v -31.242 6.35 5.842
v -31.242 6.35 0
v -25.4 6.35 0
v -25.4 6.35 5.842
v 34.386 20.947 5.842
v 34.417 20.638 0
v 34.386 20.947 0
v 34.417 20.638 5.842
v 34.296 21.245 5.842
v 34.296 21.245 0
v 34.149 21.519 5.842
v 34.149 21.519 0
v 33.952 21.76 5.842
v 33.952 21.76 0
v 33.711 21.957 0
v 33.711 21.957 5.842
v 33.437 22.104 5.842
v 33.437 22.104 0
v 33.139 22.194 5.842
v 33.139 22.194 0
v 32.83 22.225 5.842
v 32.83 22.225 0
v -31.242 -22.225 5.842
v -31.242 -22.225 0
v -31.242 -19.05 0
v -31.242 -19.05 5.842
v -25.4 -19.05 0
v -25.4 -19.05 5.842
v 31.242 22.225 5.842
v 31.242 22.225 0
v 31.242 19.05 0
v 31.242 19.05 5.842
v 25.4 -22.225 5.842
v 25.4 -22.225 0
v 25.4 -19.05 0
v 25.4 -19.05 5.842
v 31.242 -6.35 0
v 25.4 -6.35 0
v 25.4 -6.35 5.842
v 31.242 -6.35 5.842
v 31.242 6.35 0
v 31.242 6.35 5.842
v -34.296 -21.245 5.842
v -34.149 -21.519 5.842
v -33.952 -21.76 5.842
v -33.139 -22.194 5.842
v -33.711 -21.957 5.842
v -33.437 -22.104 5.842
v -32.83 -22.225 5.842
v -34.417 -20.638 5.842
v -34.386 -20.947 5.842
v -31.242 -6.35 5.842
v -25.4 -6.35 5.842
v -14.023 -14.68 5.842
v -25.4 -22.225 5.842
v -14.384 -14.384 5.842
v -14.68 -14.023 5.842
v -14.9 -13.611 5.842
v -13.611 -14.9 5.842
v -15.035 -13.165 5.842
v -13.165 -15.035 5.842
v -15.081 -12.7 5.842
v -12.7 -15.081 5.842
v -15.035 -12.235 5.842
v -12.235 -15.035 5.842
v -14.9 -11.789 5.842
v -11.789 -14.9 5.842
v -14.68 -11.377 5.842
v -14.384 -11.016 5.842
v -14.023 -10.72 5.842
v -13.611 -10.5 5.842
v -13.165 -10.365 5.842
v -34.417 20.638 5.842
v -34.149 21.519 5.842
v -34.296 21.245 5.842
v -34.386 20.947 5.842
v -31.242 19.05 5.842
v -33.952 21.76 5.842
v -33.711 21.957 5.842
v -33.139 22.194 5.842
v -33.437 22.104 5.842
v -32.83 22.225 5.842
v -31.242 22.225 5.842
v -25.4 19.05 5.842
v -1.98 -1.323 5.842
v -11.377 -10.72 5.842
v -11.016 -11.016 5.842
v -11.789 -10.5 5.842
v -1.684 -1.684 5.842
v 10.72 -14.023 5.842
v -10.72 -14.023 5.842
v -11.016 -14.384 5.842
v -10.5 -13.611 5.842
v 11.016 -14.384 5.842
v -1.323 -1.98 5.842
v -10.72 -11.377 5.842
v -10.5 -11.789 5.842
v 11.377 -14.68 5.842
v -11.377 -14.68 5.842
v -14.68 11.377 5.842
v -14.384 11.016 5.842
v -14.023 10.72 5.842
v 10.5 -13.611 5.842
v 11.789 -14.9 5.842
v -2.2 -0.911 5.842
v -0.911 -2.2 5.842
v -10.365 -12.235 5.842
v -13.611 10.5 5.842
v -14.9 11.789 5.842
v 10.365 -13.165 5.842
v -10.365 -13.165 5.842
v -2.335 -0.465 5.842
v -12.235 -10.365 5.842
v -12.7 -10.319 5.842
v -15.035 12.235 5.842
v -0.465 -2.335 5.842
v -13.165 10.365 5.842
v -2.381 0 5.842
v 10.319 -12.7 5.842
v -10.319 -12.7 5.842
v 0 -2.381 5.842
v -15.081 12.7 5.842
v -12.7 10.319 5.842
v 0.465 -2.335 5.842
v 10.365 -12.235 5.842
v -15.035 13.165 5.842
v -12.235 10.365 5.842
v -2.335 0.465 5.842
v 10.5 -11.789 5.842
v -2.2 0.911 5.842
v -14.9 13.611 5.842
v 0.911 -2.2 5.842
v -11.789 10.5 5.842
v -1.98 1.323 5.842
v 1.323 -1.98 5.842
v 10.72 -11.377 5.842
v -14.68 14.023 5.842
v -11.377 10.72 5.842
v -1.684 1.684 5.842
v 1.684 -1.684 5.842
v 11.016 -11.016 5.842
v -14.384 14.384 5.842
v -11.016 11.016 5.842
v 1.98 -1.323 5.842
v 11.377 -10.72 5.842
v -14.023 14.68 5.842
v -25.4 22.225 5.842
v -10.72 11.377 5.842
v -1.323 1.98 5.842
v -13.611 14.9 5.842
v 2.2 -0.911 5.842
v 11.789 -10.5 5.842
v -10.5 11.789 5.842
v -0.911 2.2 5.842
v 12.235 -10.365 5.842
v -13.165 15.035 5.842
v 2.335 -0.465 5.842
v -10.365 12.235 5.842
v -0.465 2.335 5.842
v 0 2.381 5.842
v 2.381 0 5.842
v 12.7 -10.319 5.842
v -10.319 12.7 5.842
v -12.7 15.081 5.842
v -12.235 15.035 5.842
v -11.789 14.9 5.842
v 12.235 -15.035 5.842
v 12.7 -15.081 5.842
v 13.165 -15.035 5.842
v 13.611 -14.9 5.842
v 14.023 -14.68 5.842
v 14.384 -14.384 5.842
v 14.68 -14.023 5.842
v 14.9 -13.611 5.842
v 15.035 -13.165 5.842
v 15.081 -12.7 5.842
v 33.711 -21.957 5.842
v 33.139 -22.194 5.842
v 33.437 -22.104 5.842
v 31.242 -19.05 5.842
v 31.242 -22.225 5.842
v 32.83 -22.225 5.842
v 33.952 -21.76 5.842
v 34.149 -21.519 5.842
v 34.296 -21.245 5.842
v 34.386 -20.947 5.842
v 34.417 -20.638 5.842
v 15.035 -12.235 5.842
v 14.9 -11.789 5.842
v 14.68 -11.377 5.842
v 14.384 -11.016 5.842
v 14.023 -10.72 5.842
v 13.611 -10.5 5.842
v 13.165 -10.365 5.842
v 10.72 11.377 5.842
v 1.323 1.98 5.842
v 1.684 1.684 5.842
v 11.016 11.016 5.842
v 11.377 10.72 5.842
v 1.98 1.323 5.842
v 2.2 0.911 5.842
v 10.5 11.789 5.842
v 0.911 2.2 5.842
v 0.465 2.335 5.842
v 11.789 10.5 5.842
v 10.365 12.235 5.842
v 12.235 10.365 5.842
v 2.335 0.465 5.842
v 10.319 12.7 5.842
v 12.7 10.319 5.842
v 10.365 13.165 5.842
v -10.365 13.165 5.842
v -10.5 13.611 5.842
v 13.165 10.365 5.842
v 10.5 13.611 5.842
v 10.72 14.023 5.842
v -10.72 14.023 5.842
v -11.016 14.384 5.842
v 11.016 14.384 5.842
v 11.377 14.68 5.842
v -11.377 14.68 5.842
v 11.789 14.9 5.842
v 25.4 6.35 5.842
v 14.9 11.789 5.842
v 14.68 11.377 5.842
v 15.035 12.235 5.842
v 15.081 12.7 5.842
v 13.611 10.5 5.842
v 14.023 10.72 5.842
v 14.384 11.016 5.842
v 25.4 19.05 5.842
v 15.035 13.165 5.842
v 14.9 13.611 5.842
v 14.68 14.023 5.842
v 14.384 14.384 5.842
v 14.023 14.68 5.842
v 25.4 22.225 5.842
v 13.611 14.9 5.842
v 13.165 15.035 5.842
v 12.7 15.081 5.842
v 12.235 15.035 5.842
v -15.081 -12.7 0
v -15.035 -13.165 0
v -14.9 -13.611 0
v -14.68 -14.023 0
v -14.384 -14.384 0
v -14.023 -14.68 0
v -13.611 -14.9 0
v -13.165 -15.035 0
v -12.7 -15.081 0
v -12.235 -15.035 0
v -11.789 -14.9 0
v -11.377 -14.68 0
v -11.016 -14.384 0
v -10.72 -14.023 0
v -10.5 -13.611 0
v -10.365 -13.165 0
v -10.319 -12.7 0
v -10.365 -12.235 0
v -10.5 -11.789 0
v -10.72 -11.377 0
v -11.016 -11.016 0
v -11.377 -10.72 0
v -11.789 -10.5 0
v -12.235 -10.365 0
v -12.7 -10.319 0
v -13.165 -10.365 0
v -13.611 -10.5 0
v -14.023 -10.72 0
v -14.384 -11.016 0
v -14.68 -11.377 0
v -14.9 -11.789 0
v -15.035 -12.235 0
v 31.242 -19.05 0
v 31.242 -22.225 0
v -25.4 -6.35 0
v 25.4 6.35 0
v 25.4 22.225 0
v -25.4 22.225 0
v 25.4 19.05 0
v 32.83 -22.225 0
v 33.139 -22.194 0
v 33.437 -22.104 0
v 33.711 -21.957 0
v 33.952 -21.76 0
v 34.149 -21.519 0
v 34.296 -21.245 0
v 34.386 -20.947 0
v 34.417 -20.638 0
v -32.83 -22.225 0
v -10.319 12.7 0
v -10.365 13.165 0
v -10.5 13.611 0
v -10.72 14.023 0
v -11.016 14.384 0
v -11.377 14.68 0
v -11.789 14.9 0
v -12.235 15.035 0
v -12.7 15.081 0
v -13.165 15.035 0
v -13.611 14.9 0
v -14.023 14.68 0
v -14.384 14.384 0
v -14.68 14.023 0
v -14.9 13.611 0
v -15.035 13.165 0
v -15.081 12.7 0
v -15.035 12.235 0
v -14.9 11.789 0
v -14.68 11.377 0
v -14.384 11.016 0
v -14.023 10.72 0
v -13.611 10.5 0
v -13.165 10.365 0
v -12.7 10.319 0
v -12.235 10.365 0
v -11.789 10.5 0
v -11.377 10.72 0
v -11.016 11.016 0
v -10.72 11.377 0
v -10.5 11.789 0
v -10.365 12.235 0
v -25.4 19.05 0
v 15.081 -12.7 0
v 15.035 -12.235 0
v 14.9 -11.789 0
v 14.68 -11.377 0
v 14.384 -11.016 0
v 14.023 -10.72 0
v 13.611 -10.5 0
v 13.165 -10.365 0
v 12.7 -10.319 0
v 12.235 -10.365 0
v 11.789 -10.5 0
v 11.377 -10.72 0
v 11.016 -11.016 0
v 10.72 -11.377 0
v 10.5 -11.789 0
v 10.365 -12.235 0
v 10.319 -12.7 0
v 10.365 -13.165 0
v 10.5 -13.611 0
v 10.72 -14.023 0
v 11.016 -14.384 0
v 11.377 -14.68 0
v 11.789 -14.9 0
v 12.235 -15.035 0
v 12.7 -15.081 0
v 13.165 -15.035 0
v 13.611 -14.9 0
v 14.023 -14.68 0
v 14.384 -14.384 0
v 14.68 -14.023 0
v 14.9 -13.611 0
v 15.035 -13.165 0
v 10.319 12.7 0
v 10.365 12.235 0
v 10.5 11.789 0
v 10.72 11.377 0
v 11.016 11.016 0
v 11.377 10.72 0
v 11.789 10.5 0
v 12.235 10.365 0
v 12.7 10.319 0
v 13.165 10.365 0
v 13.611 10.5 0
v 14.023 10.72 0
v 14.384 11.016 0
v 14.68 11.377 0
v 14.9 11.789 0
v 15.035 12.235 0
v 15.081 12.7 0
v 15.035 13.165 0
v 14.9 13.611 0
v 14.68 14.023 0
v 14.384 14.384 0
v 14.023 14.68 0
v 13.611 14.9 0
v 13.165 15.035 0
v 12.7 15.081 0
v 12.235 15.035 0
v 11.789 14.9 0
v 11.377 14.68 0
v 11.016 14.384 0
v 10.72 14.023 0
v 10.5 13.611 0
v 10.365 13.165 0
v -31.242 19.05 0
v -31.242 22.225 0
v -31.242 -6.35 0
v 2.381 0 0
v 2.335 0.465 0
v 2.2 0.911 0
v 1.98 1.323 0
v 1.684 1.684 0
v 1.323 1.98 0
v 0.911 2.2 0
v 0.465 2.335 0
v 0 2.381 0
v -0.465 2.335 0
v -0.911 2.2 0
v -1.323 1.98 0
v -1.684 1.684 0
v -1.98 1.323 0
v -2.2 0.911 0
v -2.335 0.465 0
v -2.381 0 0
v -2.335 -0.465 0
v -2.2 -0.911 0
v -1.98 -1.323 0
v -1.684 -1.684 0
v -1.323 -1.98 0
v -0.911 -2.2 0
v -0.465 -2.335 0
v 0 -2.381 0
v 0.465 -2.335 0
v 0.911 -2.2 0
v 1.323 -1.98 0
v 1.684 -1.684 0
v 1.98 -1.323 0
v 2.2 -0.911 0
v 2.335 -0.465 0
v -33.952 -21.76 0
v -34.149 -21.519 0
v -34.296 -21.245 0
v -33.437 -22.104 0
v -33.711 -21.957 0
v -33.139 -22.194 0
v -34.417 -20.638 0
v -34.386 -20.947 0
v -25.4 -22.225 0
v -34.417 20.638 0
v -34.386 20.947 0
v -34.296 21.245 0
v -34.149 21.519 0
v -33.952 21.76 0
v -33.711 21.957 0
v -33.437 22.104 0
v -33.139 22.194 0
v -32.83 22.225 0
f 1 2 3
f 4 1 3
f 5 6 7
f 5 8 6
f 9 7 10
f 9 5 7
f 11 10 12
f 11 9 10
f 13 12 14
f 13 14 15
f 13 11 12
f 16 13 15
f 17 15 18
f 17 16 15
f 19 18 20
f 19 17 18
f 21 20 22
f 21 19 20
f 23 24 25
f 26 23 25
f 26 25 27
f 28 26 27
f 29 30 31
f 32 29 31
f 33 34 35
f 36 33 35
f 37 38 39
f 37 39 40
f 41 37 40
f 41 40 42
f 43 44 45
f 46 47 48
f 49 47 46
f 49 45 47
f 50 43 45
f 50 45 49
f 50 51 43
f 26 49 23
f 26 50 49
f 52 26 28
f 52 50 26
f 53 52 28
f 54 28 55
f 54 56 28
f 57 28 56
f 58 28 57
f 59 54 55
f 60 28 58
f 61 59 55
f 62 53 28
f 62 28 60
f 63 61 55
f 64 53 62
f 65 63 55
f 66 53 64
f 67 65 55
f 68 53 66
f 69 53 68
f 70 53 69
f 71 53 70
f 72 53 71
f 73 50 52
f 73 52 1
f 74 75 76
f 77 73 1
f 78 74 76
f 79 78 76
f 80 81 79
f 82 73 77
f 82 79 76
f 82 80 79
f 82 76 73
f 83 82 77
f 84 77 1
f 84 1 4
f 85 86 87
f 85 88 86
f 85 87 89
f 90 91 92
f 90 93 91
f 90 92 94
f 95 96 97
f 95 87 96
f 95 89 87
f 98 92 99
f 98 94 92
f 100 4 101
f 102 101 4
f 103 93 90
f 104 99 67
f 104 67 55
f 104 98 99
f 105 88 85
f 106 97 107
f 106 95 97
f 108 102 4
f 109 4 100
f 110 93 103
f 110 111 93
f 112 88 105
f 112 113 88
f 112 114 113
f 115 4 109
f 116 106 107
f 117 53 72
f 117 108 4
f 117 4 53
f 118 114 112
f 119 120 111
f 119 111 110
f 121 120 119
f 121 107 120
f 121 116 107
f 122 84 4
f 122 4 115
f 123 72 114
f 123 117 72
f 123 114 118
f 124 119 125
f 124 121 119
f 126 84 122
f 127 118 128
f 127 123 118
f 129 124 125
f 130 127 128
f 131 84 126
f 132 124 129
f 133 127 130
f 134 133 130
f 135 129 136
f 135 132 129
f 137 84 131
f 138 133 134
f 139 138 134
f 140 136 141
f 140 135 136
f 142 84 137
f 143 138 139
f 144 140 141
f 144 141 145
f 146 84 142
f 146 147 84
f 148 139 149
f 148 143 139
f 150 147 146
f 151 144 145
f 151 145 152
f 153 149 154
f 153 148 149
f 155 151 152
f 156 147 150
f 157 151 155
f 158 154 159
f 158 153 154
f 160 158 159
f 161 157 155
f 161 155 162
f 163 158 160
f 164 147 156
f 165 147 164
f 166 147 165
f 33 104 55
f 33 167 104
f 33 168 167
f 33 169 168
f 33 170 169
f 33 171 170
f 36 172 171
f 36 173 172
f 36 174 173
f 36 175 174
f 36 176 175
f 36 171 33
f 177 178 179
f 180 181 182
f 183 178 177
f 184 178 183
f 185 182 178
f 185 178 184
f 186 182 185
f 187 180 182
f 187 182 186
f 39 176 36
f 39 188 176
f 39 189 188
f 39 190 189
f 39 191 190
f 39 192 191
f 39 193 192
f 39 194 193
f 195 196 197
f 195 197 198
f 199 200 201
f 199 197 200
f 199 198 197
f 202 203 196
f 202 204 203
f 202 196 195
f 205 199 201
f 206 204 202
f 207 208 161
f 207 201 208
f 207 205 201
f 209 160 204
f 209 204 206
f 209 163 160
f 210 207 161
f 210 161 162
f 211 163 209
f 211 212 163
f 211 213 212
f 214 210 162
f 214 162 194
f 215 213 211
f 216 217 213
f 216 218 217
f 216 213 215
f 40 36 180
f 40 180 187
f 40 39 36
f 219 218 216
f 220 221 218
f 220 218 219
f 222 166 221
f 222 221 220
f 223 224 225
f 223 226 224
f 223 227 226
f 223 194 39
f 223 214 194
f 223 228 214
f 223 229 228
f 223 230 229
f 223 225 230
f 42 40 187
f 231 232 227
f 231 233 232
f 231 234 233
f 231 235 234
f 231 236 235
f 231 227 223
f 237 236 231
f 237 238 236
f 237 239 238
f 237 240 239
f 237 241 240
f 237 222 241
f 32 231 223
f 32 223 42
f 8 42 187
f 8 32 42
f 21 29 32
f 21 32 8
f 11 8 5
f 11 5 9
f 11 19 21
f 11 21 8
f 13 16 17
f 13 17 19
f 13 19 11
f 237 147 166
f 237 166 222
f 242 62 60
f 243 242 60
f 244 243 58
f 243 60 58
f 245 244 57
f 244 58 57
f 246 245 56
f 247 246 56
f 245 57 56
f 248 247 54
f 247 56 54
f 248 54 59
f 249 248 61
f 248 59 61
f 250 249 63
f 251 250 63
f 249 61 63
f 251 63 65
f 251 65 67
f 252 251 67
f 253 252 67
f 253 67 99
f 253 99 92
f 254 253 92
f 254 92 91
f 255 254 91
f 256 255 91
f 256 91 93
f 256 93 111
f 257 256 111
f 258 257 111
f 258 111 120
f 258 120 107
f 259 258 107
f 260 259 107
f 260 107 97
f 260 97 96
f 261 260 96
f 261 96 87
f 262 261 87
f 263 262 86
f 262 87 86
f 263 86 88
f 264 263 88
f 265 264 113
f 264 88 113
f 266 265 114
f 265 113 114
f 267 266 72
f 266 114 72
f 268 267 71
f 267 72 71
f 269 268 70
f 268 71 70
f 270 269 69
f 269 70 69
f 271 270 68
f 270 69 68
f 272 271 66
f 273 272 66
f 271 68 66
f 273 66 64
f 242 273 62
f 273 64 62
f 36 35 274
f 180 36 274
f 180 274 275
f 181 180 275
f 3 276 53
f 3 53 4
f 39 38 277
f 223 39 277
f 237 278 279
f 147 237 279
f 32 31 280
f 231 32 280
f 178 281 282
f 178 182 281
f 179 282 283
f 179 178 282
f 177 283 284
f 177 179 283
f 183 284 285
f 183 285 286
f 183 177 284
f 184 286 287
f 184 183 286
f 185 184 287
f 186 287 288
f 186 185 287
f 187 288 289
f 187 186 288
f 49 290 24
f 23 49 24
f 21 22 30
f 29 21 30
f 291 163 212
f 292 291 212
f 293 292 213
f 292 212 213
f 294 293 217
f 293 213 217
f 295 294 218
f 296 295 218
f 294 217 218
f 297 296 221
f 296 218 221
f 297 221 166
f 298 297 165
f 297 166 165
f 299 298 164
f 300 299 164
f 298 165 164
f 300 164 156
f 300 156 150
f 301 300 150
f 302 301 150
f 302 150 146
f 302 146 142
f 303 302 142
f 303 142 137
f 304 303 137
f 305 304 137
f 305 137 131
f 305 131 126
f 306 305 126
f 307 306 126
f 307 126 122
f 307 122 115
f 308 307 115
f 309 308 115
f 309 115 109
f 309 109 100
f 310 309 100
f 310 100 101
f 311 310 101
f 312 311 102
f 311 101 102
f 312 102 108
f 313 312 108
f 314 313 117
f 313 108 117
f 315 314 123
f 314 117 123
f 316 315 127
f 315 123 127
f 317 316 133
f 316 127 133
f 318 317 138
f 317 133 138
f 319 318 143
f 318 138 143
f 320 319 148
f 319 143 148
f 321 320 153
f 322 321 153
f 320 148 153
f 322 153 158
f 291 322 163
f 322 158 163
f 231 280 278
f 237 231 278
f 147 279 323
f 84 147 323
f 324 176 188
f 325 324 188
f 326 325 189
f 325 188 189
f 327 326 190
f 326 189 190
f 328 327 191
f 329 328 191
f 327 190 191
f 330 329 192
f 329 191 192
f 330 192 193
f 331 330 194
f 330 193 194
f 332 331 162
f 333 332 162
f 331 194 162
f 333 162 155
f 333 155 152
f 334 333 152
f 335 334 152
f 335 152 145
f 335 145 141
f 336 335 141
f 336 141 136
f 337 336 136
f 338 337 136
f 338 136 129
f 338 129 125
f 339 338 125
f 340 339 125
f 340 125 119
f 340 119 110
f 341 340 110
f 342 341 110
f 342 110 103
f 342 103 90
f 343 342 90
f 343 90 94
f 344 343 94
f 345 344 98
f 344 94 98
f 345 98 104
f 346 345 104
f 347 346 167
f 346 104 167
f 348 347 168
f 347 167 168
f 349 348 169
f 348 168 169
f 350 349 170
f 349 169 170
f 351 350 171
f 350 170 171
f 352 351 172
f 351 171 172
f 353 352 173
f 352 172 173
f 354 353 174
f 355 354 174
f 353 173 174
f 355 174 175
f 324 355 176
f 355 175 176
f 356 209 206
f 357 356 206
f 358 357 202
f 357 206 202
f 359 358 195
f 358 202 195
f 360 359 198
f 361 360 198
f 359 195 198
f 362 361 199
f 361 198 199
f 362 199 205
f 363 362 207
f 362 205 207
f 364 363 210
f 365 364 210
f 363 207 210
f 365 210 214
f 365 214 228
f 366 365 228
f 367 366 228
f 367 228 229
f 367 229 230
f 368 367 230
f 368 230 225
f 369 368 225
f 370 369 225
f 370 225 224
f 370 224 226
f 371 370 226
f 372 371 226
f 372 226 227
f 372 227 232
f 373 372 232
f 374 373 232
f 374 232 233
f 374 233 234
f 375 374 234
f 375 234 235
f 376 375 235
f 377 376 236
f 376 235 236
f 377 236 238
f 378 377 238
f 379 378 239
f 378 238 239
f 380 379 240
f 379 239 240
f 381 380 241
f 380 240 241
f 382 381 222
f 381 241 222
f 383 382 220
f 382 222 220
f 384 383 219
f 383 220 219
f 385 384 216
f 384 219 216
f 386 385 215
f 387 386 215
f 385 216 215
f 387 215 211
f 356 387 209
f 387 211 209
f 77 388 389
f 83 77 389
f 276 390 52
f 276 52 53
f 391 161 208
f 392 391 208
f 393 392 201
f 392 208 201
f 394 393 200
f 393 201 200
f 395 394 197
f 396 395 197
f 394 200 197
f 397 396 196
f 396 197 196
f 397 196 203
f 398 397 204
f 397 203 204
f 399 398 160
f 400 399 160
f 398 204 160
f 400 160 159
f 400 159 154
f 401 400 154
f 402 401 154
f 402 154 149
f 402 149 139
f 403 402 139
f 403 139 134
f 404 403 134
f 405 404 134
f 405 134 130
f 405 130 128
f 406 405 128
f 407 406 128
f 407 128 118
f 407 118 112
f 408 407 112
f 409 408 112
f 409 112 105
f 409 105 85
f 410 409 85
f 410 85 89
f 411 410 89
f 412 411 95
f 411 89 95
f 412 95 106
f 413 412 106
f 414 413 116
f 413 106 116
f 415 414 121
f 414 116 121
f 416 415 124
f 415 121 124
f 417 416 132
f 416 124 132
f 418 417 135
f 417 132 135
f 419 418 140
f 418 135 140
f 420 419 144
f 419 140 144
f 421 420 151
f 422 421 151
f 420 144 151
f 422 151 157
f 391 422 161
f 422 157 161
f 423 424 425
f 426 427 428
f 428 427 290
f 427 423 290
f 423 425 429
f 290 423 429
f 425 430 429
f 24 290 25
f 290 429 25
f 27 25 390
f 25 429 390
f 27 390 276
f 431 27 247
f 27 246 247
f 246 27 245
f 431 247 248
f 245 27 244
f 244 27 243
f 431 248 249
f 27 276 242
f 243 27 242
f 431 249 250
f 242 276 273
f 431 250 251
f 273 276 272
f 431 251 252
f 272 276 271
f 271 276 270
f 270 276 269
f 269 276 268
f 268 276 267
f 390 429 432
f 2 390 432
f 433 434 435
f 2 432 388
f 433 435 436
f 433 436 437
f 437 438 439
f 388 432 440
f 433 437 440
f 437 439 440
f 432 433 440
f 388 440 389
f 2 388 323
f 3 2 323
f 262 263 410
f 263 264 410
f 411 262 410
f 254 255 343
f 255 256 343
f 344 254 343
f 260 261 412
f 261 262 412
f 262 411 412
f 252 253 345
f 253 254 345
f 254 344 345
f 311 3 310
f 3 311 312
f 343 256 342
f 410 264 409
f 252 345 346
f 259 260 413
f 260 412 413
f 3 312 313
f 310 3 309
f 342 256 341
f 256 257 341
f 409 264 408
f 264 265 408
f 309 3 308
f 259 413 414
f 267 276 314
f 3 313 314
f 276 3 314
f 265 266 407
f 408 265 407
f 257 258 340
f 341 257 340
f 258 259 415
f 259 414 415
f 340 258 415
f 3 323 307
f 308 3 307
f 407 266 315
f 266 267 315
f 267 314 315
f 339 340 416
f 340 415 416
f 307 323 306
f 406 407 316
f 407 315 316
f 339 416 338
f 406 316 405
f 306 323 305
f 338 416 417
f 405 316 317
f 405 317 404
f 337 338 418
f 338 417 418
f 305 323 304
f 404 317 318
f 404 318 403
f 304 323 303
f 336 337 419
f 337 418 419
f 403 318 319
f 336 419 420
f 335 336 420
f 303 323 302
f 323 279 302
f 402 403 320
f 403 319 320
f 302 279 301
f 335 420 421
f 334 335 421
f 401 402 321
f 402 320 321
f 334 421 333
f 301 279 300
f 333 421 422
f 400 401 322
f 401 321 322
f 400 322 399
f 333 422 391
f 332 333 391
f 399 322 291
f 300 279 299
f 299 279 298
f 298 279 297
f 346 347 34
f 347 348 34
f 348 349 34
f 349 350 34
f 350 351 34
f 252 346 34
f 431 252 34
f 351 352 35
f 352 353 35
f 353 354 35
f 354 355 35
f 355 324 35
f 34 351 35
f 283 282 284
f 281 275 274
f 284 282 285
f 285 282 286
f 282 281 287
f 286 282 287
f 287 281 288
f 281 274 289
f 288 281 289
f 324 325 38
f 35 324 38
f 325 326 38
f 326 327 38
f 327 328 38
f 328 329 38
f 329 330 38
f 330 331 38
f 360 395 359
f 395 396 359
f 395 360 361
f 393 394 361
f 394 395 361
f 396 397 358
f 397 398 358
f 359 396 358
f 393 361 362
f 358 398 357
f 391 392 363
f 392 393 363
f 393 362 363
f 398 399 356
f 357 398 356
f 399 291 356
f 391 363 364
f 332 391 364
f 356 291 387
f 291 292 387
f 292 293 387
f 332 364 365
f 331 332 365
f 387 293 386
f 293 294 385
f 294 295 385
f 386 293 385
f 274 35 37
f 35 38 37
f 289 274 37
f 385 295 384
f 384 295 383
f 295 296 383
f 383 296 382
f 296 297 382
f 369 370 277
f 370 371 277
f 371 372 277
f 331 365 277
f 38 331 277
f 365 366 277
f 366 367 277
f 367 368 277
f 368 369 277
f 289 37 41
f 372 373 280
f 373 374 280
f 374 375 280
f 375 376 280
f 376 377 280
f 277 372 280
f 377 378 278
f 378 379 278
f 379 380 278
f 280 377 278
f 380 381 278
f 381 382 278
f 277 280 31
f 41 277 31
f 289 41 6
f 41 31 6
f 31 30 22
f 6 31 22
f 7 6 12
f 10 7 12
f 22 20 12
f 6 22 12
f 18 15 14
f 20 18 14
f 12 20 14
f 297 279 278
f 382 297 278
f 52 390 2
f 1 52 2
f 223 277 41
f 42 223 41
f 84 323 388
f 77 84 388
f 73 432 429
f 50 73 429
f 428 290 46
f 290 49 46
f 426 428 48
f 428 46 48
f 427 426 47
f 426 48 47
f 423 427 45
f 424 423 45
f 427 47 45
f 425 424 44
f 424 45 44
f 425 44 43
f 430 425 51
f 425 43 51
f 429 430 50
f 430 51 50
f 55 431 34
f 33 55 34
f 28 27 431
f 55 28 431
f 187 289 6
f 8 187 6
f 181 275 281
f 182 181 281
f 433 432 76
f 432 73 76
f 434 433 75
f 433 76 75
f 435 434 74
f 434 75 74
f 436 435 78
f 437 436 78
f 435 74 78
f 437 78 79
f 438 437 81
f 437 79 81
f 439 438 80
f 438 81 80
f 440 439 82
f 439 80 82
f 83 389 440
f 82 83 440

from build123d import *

# Parameters (mm, degrees)
SKETCH1_W           = 5.842
SKETCH1_H           = 12.7
BOSS_EXTRUDE1_DEPTH = 5.842
FILLET1_R           = 1.5875
SKETCH3_R           = 2.38125
CUT_EXTRUDE2_DEPTH  = 42.383686134


with BuildPart() as part:
    # Sketch1 → Boss-Extrude1 (new body)
    with BuildSketch(Plane.XY):
        Polygon((-25.4, -22.225), (25.4, -22.225), (25.4, -19.05), (31.242, -19.05), (31.242, -22.225), (34.417, -22.225), (34.417, 22.225), (31.242, 22.225), (31.242, 19.05), (25.4, 19.05), (25.4, 22.225), (-25.4, 22.225), (-25.4, 19.05), (-31.242, 19.05), (-31.242, 22.225), (-34.417, 22.225), (-34.417, -22.225), (-31.242, -22.225), (-31.242, -19.05), (-25.4, -19.05), align=None)
        with Locations((28.321, 0)):
            Rectangle(SKETCH1_W, SKETCH1_H, mode=Mode.SUBTRACT)
        with Locations((-28.321, 0)):
            Rectangle(SKETCH1_W, SKETCH1_H, mode=Mode.SUBTRACT)
    extrude(amount=BOSS_EXTRUDE1_DEPTH)

    # Fillet1
    fillet1_edges = [part.edges().sort_by_distance(p)[0] for p in [
        (34.417, 22.225, 2.921),
        (34.417, -22.225, 2.921),
        (-34.417, -22.225, 2.921),
        (-34.417, 22.225, 2.921),
    ]]
    fillet(fillet1_edges, radius=FILLET1_R)

    # Sketch3 → Cut-Extrude2 (cut, through all)
    with BuildSketch(Plane.XY.offset(5.842)):
        Circle(SKETCH3_R)
        with Locations((-12.7, 12.7)):
            Circle(SKETCH3_R)
        with Locations(Location((-12.7, -12.7, 0), (0, 0, 180))):
            Circle(SKETCH3_R)
        with Locations((12.7, -12.7)):
            Circle(SKETCH3_R)
        with Locations(Location((12.7, 12.7, 0), (0, 0, 180))):
            Circle(SKETCH3_R)
    extrude(amount=-CUT_EXTRUDE2_DEPTH, mode=Mode.SUBTRACT)


solid = part.part
